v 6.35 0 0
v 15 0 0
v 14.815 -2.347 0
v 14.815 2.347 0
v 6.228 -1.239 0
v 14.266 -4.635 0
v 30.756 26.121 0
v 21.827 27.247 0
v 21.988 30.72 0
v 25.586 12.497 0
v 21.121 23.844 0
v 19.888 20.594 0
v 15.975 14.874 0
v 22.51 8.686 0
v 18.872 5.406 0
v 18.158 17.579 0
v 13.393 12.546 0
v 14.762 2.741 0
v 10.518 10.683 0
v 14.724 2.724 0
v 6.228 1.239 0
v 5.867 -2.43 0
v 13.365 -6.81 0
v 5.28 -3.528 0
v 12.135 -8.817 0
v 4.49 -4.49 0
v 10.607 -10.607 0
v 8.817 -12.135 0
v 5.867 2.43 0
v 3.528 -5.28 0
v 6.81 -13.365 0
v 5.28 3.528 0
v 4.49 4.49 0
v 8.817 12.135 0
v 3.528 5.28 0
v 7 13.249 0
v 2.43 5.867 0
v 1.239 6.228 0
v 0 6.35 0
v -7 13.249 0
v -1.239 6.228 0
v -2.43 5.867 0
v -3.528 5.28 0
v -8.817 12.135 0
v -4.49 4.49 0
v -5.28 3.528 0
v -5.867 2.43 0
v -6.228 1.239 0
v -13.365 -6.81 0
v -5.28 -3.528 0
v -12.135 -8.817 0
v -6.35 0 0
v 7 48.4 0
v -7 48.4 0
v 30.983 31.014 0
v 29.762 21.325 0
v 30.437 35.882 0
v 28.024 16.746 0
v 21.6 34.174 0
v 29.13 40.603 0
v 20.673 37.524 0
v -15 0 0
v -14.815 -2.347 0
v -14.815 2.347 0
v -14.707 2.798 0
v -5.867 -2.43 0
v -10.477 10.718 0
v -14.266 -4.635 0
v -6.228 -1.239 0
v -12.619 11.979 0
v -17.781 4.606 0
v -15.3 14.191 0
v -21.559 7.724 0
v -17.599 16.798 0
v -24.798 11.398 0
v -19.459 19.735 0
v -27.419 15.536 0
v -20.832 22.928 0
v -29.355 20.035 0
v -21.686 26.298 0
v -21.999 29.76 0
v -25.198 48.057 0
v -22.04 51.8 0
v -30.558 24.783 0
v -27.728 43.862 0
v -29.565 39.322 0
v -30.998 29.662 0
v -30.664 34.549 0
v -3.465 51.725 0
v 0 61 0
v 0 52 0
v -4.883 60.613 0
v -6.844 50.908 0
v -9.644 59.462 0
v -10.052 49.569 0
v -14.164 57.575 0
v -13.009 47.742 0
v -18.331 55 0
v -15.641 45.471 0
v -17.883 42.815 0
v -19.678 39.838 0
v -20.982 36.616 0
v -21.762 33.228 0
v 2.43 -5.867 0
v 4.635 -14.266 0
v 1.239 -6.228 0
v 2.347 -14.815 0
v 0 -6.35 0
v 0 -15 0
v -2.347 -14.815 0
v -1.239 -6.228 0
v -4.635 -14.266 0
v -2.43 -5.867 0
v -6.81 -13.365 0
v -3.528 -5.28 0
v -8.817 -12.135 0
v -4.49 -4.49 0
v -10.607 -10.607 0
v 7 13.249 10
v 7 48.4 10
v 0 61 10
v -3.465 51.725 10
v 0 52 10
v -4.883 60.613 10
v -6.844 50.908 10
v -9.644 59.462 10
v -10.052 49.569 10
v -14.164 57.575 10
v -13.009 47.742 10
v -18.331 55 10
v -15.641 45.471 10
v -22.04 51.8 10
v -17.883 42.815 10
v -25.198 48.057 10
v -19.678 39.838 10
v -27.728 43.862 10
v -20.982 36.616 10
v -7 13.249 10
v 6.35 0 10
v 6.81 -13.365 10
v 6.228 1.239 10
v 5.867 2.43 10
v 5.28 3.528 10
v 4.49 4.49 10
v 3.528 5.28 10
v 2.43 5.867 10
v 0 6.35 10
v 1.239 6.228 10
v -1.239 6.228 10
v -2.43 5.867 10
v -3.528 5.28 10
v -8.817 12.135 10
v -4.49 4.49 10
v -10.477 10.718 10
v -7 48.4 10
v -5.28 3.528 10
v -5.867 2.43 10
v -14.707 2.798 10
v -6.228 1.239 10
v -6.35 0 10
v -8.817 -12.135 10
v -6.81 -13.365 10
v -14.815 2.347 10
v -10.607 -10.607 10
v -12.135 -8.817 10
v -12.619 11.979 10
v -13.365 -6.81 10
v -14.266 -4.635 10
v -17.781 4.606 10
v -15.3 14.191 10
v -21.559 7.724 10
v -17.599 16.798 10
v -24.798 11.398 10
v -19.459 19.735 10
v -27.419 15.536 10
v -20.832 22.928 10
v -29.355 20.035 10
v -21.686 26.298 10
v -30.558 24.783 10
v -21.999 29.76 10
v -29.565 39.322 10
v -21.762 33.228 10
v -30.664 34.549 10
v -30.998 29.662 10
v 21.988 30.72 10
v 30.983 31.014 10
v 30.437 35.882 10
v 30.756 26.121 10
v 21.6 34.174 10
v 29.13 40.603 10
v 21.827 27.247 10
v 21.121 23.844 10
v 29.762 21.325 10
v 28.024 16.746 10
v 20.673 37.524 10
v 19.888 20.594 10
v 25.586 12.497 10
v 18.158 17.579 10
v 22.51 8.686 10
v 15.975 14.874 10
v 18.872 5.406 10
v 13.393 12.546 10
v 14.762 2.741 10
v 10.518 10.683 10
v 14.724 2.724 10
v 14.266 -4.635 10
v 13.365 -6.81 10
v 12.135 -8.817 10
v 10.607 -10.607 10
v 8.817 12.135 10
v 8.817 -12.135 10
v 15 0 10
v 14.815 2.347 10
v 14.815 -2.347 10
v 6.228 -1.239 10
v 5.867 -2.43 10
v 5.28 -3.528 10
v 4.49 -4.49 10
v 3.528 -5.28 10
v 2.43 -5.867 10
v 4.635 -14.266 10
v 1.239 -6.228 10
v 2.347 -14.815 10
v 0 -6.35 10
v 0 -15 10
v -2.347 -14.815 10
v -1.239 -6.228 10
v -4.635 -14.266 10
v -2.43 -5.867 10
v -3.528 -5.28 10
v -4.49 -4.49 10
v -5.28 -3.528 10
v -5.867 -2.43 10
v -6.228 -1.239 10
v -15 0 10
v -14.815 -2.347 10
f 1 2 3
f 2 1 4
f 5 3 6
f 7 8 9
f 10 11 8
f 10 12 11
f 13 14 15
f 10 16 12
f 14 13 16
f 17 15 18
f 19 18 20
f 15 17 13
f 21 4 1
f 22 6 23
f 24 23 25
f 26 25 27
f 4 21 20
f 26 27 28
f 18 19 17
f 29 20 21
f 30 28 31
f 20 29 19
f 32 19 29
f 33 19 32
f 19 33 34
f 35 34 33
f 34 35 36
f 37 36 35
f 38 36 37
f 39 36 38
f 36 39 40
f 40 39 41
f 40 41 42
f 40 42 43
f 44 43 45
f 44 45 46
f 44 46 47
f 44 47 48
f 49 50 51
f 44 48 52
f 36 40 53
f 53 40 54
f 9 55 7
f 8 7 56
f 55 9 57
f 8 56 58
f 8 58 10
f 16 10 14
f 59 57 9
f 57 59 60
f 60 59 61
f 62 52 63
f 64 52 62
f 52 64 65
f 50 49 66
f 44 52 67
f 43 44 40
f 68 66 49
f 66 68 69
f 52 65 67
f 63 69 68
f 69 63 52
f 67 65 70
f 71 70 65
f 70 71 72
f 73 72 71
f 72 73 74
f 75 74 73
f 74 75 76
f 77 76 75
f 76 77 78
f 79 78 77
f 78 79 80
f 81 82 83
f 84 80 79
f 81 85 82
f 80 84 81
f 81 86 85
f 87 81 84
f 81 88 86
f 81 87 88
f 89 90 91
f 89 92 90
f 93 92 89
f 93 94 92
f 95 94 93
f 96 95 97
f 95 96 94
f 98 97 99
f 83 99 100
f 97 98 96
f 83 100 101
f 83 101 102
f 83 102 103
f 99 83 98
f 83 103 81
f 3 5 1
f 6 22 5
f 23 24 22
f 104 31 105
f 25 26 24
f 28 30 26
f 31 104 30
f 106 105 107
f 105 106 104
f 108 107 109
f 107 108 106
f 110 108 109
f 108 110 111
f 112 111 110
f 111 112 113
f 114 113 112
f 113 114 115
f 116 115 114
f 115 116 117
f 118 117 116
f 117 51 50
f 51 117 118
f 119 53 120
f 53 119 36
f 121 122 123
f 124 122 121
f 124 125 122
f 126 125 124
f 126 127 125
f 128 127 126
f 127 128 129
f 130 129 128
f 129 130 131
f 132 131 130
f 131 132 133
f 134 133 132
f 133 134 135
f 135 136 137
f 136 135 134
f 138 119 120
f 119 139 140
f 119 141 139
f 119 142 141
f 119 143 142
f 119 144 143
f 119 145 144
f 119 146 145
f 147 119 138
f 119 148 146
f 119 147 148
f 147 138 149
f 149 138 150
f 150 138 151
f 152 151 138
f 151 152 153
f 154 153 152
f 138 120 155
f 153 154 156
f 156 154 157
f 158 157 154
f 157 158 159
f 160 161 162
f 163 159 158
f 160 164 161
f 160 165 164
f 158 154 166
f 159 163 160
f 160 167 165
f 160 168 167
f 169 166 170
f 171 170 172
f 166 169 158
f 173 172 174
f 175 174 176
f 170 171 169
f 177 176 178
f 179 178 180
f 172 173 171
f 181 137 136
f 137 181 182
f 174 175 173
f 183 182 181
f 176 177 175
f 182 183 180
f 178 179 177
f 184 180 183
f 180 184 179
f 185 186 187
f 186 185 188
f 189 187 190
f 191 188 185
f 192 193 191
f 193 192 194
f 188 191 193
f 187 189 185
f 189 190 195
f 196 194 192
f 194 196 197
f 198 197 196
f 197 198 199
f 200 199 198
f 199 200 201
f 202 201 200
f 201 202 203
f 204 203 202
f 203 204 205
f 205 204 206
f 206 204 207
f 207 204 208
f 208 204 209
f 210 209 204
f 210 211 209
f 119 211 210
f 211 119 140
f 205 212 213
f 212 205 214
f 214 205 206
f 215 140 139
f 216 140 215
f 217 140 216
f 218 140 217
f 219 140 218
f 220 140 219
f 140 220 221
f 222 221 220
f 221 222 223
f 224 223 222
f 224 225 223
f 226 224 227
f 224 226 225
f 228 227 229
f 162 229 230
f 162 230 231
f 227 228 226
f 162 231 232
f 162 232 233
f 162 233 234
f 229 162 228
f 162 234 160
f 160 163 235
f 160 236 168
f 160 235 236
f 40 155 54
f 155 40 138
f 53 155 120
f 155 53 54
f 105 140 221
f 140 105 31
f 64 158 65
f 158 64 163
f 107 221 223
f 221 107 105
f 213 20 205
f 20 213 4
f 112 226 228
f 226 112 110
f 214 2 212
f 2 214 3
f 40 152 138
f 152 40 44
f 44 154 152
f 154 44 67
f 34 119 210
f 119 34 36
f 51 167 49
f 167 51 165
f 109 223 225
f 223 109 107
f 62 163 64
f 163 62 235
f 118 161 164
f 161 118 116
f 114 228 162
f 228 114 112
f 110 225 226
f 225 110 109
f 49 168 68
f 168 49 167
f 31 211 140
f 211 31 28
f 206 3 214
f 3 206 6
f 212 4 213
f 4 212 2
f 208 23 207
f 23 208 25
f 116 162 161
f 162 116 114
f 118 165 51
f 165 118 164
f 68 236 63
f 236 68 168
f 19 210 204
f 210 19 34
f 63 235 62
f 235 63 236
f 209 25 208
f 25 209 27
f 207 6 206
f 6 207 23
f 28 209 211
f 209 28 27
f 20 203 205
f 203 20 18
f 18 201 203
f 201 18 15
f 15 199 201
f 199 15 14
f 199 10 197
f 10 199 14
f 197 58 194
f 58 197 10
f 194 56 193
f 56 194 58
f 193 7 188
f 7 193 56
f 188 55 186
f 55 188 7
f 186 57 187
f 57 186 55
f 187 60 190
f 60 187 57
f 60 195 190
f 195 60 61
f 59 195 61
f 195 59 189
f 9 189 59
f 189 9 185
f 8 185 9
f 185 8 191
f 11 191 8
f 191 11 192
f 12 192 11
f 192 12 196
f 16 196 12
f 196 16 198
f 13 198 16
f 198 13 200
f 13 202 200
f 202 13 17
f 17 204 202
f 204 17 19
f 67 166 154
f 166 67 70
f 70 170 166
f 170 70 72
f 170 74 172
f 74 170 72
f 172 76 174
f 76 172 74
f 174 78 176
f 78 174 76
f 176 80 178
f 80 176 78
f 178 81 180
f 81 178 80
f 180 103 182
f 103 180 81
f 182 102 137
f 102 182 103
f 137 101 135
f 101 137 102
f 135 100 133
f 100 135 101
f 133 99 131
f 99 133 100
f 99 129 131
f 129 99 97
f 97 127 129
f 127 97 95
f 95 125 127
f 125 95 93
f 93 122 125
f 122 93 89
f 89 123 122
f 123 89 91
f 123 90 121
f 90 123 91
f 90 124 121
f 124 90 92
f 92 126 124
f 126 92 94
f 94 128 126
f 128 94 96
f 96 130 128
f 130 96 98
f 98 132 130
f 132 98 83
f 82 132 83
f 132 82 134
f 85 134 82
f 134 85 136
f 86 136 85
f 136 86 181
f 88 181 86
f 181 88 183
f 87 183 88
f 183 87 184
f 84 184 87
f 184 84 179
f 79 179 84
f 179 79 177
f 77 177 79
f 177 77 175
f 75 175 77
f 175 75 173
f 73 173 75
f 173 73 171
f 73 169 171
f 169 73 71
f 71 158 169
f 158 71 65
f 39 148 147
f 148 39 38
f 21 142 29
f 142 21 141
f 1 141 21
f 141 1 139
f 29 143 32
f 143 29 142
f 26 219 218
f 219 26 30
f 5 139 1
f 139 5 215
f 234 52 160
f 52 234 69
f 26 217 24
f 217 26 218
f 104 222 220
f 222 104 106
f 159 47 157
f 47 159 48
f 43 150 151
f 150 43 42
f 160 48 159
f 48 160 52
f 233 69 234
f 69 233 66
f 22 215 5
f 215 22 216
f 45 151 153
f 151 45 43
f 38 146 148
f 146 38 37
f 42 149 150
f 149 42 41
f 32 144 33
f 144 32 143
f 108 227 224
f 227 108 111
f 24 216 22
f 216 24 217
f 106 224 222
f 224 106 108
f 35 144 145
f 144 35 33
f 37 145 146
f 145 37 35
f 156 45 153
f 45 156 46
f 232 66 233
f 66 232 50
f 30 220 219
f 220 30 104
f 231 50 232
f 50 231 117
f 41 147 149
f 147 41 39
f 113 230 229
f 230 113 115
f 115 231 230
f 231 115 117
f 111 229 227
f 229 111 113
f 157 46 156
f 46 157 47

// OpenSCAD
$fn = 32;

// ----------------------------------------------------------------------
// Hook: 60 mm shank into a 22 mm curl, 10 mm thick
// ----------------------------------------------------------------------

// --- parameters (mm) ---
shank_len = 60;           // shank length from the boss centre
shank_w = 14;             // shank width
boss_d = 30;              // boss diameter
bore_d = 12.7;            // boss bore
curl_in = 22;             // curl inner radius
curl_out = 31;            // curl outer radius
curl_sweep = 290;         // curl sweep angle
hook_t = 10;              // hook thickness

shank_profile = [[-7, 48.4], [7, 48.4], [7, 13], [-7, 13]];
boss_profile = [[15, 0], [14.815, 2.347], [14.266, 4.635], [13.365, 6.81], [12.135, 8.817], [10.607, 10.607], [8.817, 12.135], [6.81, 13.365], [4.635, 14.266], [2.347, 14.815], [0, 15], [-2.347, 14.815], [-4.635, 14.266], [-6.81, 13.365], [-8.817, 12.135], [-10.607, 10.607], [-12.135, 8.817], [-13.365, 6.81], [-14.266, 4.635], [-14.815, 2.347], [-15, 0], [-14.815, -2.347], [-14.266, -4.635], [-13.365, -6.81], [-12.135, -8.817], [-10.607, -10.607], [-8.817, -12.135], [-6.81, -13.365], [-4.635, -14.266], [-2.347, -14.815], [0, -15], [2.347, -14.815], [4.635, -14.266], [6.81, -13.365], [8.817, -12.135], [10.607, -10.607], [12.135, -8.817], [13.365, -6.81], [14.266, -4.635], [14.815, -2.347]];
curl_profile = [[0, 61], [-4.883, 60.613], [-9.644, 59.462], [-14.164, 57.575], [-18.331, 55], [-22.04, 51.8], [-25.198, 48.057], [-27.728, 43.862], [-29.565, 39.322], [-30.664, 34.549], [-30.998, 29.662], [-30.558, 24.783], [-29.355, 20.035], [-27.419, 15.536], [-24.798, 11.398], [-21.559, 7.724], [-17.781, 4.606], [-13.559, 2.123], [-8.999, 0.335], [-4.214, -0.712], [0.676, -0.993], [5.55, -0.499], [10.284, 0.756], [14.762, 2.741], [18.872, 5.406], [22.51, 8.686], [25.586, 12.497], [28.024, 16.746], [29.762, 21.325], [30.756, 26.121], [30.983, 31.014], [30.437, 35.882], [29.13, 40.603], [20.673, 37.524], [21.6, 34.174], [21.988, 30.72], [21.827, 27.247], [21.121, 23.844], [19.888, 20.594], [18.158, 17.579], [15.975, 14.874], [13.393, 12.546], [10.476, 10.655], [7.298, 9.246], [3.938, 8.355], [0.48, 8.005], [-2.99, 8.204], [-6.386, 8.947], [-9.623, 10.216], [-12.619, 11.979], [-15.3, 14.191], [-17.599, 16.798], [-19.459, 19.735], [-20.832, 22.928], [-21.686, 26.298], [-21.999, 29.76], [-21.762, 33.228], [-20.982, 36.616], [-19.678, 39.838], [-17.883, 42.815], [-15.641, 45.471], [-13.009, 47.742], [-10.052, 49.569], [-6.844, 50.908], [-3.465, 51.725], [0, 52]];

difference() {
  union() {
    /* three overlapping outlines: shank, boss and the smooth curl */
    linear_extrude(height = hook_t) polygon(shank_profile);
    linear_extrude(height = hook_t) polygon(boss_profile);
    linear_extrude(height = hook_t) polygon(curl_profile);
  }
  translate([0, 0, -2.5]) cylinder(h = hook_t + 5, d = bore_d);
}
